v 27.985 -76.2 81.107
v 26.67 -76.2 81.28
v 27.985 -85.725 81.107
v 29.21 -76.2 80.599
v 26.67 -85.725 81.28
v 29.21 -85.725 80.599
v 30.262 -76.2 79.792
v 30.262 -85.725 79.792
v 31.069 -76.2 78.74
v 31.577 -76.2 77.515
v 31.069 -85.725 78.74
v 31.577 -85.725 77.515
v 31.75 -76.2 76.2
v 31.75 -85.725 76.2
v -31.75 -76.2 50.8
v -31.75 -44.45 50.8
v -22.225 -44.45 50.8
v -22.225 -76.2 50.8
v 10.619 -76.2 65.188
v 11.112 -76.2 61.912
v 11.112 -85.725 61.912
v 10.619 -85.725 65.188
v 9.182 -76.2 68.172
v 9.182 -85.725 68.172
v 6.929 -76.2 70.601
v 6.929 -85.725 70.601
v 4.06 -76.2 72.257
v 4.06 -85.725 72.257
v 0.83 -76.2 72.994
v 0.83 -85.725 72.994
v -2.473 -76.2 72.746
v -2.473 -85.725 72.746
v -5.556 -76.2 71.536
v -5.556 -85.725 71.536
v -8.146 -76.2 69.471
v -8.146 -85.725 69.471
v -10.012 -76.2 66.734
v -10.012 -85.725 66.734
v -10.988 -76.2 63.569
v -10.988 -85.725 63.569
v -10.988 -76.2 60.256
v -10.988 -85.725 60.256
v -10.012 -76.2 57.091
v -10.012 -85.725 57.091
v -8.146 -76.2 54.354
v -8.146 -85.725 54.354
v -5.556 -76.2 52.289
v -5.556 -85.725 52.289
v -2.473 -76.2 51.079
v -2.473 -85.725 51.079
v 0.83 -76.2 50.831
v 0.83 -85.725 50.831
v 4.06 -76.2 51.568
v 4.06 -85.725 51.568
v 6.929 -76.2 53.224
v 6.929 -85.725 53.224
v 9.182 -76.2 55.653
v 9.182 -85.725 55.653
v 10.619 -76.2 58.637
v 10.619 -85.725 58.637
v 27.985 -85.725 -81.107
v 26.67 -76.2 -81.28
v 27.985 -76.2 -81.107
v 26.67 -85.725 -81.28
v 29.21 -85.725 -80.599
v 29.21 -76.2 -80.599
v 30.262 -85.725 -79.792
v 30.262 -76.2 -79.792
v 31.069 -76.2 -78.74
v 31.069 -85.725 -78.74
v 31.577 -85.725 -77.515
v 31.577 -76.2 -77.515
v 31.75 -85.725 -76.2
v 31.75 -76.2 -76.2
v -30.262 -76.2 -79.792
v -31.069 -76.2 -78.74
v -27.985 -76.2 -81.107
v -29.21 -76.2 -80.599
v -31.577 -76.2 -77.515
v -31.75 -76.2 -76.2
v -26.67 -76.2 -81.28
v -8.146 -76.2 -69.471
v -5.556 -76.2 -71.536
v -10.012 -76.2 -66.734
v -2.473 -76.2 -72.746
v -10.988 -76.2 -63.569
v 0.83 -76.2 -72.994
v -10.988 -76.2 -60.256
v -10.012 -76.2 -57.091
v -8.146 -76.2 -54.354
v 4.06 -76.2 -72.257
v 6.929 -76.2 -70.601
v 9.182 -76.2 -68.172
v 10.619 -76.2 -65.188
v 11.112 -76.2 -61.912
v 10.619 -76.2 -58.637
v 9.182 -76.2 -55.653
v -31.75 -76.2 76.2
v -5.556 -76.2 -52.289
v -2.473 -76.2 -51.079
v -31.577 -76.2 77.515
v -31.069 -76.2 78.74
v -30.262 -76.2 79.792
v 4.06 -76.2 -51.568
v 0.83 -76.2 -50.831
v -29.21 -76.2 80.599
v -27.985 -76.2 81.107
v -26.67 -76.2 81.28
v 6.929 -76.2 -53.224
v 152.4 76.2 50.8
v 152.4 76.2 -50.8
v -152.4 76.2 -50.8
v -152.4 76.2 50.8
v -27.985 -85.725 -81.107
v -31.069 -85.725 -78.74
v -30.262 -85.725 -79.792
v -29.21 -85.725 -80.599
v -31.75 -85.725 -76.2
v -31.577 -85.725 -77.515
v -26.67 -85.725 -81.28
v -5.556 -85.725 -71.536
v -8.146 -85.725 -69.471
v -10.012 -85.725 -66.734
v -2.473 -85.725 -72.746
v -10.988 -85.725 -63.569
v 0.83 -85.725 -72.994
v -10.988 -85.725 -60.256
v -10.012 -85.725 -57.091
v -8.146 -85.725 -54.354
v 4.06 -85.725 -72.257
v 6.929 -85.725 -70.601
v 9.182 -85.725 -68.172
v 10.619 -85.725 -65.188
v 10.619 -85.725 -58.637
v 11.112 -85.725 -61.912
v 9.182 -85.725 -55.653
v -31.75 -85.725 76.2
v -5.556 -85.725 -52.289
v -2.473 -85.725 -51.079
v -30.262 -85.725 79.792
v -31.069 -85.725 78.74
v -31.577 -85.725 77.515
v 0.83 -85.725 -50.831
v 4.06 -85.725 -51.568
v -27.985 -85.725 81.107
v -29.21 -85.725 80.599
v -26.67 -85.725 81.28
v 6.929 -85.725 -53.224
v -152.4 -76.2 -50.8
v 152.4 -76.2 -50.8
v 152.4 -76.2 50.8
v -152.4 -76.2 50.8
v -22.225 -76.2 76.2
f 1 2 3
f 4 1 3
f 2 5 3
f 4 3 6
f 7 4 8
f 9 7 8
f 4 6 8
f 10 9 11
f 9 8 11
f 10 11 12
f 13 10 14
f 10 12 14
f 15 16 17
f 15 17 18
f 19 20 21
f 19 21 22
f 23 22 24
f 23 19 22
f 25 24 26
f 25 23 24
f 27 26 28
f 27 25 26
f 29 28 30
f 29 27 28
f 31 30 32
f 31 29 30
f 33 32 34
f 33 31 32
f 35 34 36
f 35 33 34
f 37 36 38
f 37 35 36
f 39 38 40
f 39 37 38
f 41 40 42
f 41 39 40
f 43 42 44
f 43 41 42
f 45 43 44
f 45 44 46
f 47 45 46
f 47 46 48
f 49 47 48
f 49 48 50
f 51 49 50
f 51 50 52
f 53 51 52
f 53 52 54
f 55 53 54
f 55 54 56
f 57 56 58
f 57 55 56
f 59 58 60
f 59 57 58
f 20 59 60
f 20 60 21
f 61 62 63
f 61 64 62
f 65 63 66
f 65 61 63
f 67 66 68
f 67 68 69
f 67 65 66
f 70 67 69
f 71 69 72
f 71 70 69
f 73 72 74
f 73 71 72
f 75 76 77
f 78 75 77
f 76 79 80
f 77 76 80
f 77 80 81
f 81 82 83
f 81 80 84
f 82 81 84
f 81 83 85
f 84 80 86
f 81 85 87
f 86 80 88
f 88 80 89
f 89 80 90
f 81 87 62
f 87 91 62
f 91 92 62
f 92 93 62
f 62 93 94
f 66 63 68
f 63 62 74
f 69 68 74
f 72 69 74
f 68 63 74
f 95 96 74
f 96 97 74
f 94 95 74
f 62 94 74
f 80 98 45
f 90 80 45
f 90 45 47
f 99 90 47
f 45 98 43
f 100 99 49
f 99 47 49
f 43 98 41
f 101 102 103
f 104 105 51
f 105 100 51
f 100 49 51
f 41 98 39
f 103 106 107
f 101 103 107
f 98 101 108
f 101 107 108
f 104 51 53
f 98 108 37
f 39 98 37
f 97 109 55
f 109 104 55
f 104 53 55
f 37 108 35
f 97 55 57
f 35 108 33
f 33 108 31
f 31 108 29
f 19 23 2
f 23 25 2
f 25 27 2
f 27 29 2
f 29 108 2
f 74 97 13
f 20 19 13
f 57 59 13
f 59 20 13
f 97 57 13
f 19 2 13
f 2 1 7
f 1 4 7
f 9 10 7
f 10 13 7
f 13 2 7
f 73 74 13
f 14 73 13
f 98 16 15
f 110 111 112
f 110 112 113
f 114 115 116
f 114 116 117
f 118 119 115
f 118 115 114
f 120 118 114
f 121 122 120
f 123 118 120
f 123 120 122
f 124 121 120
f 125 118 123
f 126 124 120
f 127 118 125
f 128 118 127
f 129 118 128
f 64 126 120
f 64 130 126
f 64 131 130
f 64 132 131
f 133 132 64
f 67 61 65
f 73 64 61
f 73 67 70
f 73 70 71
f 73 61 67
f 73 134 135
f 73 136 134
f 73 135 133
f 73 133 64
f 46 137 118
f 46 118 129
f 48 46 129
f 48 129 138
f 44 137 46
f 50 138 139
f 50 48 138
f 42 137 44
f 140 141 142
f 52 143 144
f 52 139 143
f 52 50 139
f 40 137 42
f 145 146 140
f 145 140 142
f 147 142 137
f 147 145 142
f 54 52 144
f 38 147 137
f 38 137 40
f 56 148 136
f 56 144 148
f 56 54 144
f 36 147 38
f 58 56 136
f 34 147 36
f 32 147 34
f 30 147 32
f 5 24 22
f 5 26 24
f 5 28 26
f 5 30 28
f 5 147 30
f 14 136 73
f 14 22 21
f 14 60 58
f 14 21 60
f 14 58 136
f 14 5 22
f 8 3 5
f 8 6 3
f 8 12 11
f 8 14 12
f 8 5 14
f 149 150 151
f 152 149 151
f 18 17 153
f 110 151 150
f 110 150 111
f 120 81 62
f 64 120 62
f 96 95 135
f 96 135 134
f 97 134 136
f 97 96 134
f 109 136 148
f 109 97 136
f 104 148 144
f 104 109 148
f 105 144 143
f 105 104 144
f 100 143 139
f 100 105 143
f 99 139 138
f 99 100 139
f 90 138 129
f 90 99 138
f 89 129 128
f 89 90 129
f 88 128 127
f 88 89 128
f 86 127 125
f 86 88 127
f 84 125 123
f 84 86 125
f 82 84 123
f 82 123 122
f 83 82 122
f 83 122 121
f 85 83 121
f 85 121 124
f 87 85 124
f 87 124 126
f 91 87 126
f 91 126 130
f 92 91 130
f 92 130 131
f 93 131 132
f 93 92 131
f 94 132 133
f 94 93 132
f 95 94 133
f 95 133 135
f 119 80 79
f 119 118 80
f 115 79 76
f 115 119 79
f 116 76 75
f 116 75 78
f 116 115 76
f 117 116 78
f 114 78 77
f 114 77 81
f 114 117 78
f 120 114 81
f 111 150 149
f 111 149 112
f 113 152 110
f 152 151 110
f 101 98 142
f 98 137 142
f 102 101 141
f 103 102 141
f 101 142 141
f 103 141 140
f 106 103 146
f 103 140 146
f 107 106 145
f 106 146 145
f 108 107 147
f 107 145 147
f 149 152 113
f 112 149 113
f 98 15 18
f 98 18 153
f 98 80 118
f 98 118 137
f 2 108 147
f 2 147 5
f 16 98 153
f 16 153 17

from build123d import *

# Parameters (mm, degrees)
F0_W     = 152.4
F0_H     = 101.6
F1_DEPTH = 152.4
F2_W     = 63.5
F2_H     = 162.56
F2_R     = 11.1125
F3_DEPTH = 9.525
F4_R     = 5.08
F6_DEPTH = 9.525


with BuildPart() as f1:
    # F0 (on Right) → F1 (new body, symmetric)
    with BuildSketch(Plane.YZ):
        Rectangle(F0_W, F0_H)
    extrude(amount=F1_DEPTH, both=True)


with BuildPart() as f3:
    # F2 (on face) → F3 (new body)
    with BuildSketch(Plane.XZ.offset(76.2)):
        Rectangle(F2_W, F2_H)
        with Locations((0, -61.9125)):
            Circle(F2_R, mode=Mode.SUBTRACT)
        with Locations((0, 61.9125)):
            Circle(F2_R, mode=Mode.SUBTRACT)
    extrude(amount=F3_DEPTH)

    # F4
    f4_edges = [f3.edges().sort_by_distance(p)[0] for p in [
        (-31.75, -80.9625, 81.28),
        (31.75, -80.9625, 81.28),
        (-31.75, -80.9625, -81.28),
        (31.75, -80.9625, -81.28),
    ]]
    fillet(f4_edges, radius=F4_R)


with BuildPart() as f6:
    # F5 (on face) → F6 (new body)
    with BuildSketch(Plane(origin=(-31.75, 0, 0), x_dir=(0, -1, 0), z_dir=(-1, 0, 0))):
        Polygon((44.45, 50.8), (76.2, 50.8), (76.2, 76.2), align=None)
    extrude(amount=-F6_DEPTH)


solid = Compound([f1.part, f3.part, f6.part])
